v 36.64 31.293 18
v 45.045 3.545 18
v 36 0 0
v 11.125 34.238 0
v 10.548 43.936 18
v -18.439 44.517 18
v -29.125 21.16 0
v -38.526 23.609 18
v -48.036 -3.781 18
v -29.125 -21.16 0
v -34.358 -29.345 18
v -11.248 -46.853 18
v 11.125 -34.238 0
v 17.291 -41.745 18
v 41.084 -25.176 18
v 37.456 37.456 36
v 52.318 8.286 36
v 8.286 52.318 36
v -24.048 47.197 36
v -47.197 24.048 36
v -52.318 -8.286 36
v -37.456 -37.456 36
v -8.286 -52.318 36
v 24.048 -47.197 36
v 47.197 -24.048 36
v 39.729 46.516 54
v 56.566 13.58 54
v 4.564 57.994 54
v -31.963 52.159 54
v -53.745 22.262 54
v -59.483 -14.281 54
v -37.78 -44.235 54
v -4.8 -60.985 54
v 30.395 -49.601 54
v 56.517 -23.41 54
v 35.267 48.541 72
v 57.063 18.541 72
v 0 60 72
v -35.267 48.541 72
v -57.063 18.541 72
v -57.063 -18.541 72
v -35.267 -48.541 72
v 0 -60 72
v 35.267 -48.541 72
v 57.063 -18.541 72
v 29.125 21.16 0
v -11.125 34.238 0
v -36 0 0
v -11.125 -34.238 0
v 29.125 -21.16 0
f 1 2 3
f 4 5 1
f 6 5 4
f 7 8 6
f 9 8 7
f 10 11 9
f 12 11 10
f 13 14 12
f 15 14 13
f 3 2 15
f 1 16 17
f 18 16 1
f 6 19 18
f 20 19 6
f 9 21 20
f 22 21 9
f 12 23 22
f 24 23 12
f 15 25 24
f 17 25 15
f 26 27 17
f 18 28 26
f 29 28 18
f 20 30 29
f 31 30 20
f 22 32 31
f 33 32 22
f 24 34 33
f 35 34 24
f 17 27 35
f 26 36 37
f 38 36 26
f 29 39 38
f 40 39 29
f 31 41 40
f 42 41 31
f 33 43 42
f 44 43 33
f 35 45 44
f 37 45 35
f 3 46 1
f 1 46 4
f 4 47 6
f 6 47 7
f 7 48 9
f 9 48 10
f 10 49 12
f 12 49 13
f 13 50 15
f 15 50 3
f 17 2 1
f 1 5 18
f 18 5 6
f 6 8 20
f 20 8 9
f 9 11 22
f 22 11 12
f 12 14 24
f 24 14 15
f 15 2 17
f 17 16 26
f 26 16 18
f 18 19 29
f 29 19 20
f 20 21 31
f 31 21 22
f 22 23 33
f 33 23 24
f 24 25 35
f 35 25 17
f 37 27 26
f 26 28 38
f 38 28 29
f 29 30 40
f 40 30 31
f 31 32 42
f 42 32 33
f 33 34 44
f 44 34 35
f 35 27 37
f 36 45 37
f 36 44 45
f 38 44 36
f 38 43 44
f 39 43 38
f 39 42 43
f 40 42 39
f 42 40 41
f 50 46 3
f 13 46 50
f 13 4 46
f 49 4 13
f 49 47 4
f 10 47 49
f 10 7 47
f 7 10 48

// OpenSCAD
// file: vase_lowpoly.scad
/*
LOW POLY VASE FACTORY
Fernando Jerez 2017
License: CC
see: https://www.thingiverse.com/thing:2638924/files
*/
module vase(shape, radius, spikes, sides, levels, twist, z_scale=1){
    altura = 180 - 180%levels; // z-steps
    step = floor(180/levels); // resolution in Z (1 is the best and slower)
    
    stepc = 360/sides; // Don't touch!

    puntos = [
        for(z = [0:step:altura])
            for(i = [0:stepc:359])
                let(

                    
                    // shape 
                    zrad  = (shape=="cylinder") ? 1 :
                            (shape=="vase1")    ? 0.7+ 0.4*sin(z*1.9) :
                            (shape=="vase2")    ? 0.6+ 0.4*pow(sin(z+60),2) :
                            (shape=="glass")    ? 0.6+ 0.4*pow(sin(z*0.7-30),2) :
                            (shape=="cup1")      ? 0.65+ 0.3 * cos(z*2+35) :
                            (shape=="cup2")     ? 0.6+ 0.35*cos(180 - z+50)*sin(180-z*2.5+45) :
                            (shape=="bowl")     ? 0.6+ 0.4 * sin(z*0.5) :
                            cos(z*0.5),
            
                    rad2  = ((z/step)%2==1 && (i/stepc)%2==1)?spikes:0,
                    g = z*twist,
                    
                    // vertex
                    r     = rad2+  zrad* radius, 
                    px    = r*cos(i+g),
                    py    = r*sin(i+g)
            
                )
            
                [px,py,z]
    ];
            
    caras = concat(
        [
        for(z = [0:(altura/step)-1])
            for(s = [0:sides-1])
                let(
                    // clockwise from left-down corner
                    f1 = s + sides*z,
                    f2 = s + sides*(z+1),
                    f3 = ((s+1) % sides) + sides*(z+1),
                    f4 = ((s+1) % sides) + sides*z
                )
            
                ( (s+z)%2==0) ? [f1,f2,f3] : [f2,f3,f4]
    
        ],
        [
        for(z = [0:(altura/step)-1])
            for(s = [0:sides-1])
                let(
                    // clockwise from left-down corner
                    f1 = s + sides*z,
                    f2 = s + sides*(z+1),
                    f3 = ((s+1) % sides) + sides*(z+1),
                    f4 = ((s+1) % sides) + sides*z
                )
                ( (s+z)%2==0) ? [f3,f4,f1] : [f4,f1,f2]
            
        ],
    
        (shape!="cone")?[[ for(s = [sides-1:-1:0]) (altura/step)*(sides) + s]]:[], //top
        [[ for(s = [0:sides-1]) s]] //bottom
            
    );       
    scale([1,1,z_scale])    
    polyhedron (points=puntos,faces = caras);
}
// main file
include <vase_lowpoly.scad>

vase(
    "bowl", //[cylinder: Cylinder, vase1:Vase, vase2:Vase 2, glass: Glass, bowl:Bowl, cup1: Cup, cup2: Cup 2, cone: Cone ]
    60, //Radius 20 to 100
    3,  //Spike size -20 to 20
    10, //Sides 3 to 30
    4,  //Levels 3 to 30
    0.1,//Twisting factor, -1 to 1
    0.4 //z-scale
);
